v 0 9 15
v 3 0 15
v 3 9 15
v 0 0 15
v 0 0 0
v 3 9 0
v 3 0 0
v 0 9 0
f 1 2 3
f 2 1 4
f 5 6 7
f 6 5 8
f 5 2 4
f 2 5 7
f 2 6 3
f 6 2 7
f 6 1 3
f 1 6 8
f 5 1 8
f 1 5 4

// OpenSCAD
// Generated by SolidPython 1.0.1 on 2020-07-29 00:46:54


cube(size = [3, 9, 15]);
/***********************************************
*********      SolidPython code:      **********
************************************************
 
# import packages: SolidPython
from solid import *
from solid.utils import *
from itertools import chain, combinations, permutations


class Resize:

    def __init__(self, scad_file):
        self.scad_file = scad_file
        #self.scad_file = import_scad(scad_file)
        # cone/cylinder param:
        self.r1 = 0
        self.r2 = 0
        self.h = 0
        # rectangular prism param:
        self.w = 0
        self.l = 0
        # ellipse param:
        self.r = 0

    # import OpenScad code (file name corresponds to shape)


    # classify shape + parameters
    def assign(self, param1, param2, param3):
        if self.scad_file == 'cone.scad':
            self.r1 = param1
            self.r2 = param2
            self.h = param3
        elif self.scad_file == 'cylinder.scad':
            self.r1 = param1
            self.r2 = param2
            self.h = param3
        elif self.scad_file == 'rectangularPrism.scad':
            self.h = param1
            self.l = param2
            self.w = param3
        else:
            self.r = param1
            self.h = param2

    # resize parameters
    def iterate(self):
        x = range(3, 20, 2)
        i = 1
        if self.scad_file == 'cone.scad':
            tempList = list(permutations(x, 2))
            for temp in tempList:
                param1 = temp[0]
                param2 = temp[1]
                filepath = 'produced_scad_files/' + 'cone' + str(param1) + '_' + str(param2) + '_' + '.scad'
                scad_render_to_file(cylinder(h=param1, r1=param2, r2=0), filepath)

        elif self.scad_file == 'cylinder.scad':
            tempList = list(permutations(x, 3))
            for temp in tempList:
                param1 = temp[0]
                param2 = temp[1]
                filepath = 'produced_scad_files/' + 'cylinder' + str(param1) + '_' + str(param2) + '_' + '.scad'
                scad_render_to_file(cylinder(h=param1, r1=param2, r2=param2), filepath)

        elif self.scad_file == 'rectangularPrism.scad':
            tempList = list(permutations(x, 3))
            for temp in tempList:
                param1 = temp[0]
                param2 = temp[1]
                param3 = temp[2]
                filepath = 'produced_scad_files/' + 'rectangularPrism' + str(param1) + '_' + str(param2) + '_' + str(
                    param3) + '.scad'
                scad_render_to_file(cube(size=(param1, param2, param3)), filepath)

        elif self.scad_file == 'ellipse.scad':
            tempList = list(permutations(x, 4))
            for temp in tempList:
                param1 = temp[0]
                param2 = temp[1]
                param3 = temp[2]
                param4 = temp[3]
                filepath = 'produced_scad_files/' + 'ellipse' + str(param1) + '_' + str(param2) + '_' + str(param3) + '_' + str(param4) + '.scad'
                scad_render_to_file(scale([param1, param2, param3])(sphere(r=param4)), filepath)

    def render_to_scadfile(self):
        scad_render_to_file(scad, 'example.scad') 
 
************************************************/
